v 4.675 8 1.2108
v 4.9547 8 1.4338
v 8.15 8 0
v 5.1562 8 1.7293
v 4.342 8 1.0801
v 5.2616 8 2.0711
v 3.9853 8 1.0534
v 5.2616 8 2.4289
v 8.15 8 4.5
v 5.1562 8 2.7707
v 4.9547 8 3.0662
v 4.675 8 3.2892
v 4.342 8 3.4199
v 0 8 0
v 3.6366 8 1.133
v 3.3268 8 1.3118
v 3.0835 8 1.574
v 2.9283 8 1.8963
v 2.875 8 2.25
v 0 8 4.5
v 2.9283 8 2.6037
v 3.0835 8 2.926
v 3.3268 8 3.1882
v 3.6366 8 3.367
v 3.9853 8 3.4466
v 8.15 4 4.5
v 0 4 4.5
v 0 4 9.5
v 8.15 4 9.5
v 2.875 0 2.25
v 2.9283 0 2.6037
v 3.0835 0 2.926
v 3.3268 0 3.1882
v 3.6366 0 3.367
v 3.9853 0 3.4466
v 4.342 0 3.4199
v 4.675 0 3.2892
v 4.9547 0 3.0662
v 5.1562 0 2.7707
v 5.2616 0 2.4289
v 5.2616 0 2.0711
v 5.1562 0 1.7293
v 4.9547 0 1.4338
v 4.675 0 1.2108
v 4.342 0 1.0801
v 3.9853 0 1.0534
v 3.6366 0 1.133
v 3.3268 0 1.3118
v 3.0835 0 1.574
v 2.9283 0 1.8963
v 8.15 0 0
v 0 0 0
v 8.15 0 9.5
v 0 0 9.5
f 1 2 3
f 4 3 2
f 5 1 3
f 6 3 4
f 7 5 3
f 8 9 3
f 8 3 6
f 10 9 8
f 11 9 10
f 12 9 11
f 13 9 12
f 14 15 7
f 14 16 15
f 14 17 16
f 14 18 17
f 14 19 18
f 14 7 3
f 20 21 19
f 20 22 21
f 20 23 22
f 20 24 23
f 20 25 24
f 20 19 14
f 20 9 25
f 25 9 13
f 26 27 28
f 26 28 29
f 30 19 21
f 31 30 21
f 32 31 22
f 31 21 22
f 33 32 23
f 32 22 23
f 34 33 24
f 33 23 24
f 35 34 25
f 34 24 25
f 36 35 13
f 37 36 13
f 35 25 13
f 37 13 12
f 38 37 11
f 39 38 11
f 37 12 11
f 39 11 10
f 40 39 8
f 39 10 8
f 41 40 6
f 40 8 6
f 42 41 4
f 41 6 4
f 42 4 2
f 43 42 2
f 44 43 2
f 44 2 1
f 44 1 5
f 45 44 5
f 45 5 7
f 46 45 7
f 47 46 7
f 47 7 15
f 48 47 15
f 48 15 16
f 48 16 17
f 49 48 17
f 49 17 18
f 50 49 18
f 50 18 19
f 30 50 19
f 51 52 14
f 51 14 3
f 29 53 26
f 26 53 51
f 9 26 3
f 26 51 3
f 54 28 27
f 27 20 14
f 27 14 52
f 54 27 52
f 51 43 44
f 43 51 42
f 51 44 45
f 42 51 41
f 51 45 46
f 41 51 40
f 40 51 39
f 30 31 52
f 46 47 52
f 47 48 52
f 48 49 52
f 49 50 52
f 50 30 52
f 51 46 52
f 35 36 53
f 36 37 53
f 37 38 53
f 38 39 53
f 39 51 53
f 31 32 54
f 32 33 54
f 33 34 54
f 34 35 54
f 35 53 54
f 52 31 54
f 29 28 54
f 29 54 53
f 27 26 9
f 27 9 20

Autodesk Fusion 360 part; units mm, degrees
sketch "Sketch1" plane through (0, 0, 0) normal (0, 1, 0) x (1, 0, 0)
  line L0 (0, 0) -> (8.15, 0)
  line L1 (8.15, 0) -> (8.15, -4.5)
  line L2 (0, 0) -> (0, -4.5)
  line L3 (8.15, -4.5) -> (0, -4.5)
  line L4 (4.075, 0) -> (4.075, -4.5)
  circle A0 centre (4.075, -2.25) radius 1.75
  dimension "d1" = 8.15
  dimension "d2" = 4.5
  dimension "d3" = 4.5
  dimension "d4" = 3.5
extrude "Extrude1" add sketch "Sketch1" along normal blind 8 contours L0 L2 L3 L4 A0 | L0 L1 L3 L4 A0
sketch "Sketch2" plane through (0, 0, 4.5) normal (0, 0, 1) x (1, 0, 0)
  line L0 (0, 0) -> (8.15, 0)
  line L1 (8.15, 0) -> (8.15, 8)
  line L2 (8.15, 8) -> (0, 8)
  line L3 (0, 8) -> (0, 0)
  line L4 (0, 8) -> (0, 3.5)
  line L5 (0, 3.5) -> (0, 0)
  line L6 (0, 4) -> (8.15, 4)
  line L7 (8.15, 4) -> (8.15, 0)
  line L8 (8.15, 0) -> (0, 0)
  dimension "d7" = 4.5
extrude "Extrude2" add sketch "Sketch2" along normal blind 5 contours L0 L1 L3 L4 L5 L6 L7 L8
sketch "Sketch3" plane through (0, 8, 0) normal (0, 1, 0) x (-1, 0, 0)
  circle A0 centre (-4.075, 2.25) radius 1.75
  line L0 (0, 0) -> (0, 4.5)
  line L1 (0, 4.5) -> (-8.15, 4.5)
  line L2 (-8.15, 4.5) -> (-8.15, 0)
  line L3 (-8.15, 0) -> (0, 0)
  circle A1 centre (-4.075, 2.25) radius 1
  dimension "d10" = 2
extrude "Extrude3" add sketch "Sketch3" against normal blind 8 contours A0
sketch "Sketch4" plane through (0, 8, 0) normal (0, 1, 0) x (-1, 0, 0)
  circle A0 centre (-4.075, 2.25) radius 1
  line L0 (0, 0) -> (0, 4.5)
  line L1 (0, 4.5) -> (-8.15, 4.5)
  line L2 (-8.15, 4.5) -> (-8.15, 0)
  line L3 (-8.15, 0) -> (0, 0)
  circle A1 centre (-4.075, 2.25) radius 0.75
  dimension "d13" = 1.5
extrude "Extrude4" add sketch "Sketch4" against normal blind 8 contours A0
sketch "Sketch5" plane through (0, 8, 0) normal (0, 1, 0) x (-1, 0, 0)
  circle A0 centre (-4.075, 2.25) radius 0.75
  line L0 (0, 0) -> (0, 4.5)
  line L1 (0, 4.5) -> (-8.15, 4.5)
  line L2 (-8.15, 4.5) -> (-8.15, 0)
  line L3 (-8.15, 0) -> (0, 0)
  circle A1 centre (-4.075, 2.25) radius 1.2
  dimension "d17" = 2.4
extrude "Extrude5" cut sketch "Sketch5" against normal blind 20 contours A1
equation "HoleDiameter = 2 mm"
